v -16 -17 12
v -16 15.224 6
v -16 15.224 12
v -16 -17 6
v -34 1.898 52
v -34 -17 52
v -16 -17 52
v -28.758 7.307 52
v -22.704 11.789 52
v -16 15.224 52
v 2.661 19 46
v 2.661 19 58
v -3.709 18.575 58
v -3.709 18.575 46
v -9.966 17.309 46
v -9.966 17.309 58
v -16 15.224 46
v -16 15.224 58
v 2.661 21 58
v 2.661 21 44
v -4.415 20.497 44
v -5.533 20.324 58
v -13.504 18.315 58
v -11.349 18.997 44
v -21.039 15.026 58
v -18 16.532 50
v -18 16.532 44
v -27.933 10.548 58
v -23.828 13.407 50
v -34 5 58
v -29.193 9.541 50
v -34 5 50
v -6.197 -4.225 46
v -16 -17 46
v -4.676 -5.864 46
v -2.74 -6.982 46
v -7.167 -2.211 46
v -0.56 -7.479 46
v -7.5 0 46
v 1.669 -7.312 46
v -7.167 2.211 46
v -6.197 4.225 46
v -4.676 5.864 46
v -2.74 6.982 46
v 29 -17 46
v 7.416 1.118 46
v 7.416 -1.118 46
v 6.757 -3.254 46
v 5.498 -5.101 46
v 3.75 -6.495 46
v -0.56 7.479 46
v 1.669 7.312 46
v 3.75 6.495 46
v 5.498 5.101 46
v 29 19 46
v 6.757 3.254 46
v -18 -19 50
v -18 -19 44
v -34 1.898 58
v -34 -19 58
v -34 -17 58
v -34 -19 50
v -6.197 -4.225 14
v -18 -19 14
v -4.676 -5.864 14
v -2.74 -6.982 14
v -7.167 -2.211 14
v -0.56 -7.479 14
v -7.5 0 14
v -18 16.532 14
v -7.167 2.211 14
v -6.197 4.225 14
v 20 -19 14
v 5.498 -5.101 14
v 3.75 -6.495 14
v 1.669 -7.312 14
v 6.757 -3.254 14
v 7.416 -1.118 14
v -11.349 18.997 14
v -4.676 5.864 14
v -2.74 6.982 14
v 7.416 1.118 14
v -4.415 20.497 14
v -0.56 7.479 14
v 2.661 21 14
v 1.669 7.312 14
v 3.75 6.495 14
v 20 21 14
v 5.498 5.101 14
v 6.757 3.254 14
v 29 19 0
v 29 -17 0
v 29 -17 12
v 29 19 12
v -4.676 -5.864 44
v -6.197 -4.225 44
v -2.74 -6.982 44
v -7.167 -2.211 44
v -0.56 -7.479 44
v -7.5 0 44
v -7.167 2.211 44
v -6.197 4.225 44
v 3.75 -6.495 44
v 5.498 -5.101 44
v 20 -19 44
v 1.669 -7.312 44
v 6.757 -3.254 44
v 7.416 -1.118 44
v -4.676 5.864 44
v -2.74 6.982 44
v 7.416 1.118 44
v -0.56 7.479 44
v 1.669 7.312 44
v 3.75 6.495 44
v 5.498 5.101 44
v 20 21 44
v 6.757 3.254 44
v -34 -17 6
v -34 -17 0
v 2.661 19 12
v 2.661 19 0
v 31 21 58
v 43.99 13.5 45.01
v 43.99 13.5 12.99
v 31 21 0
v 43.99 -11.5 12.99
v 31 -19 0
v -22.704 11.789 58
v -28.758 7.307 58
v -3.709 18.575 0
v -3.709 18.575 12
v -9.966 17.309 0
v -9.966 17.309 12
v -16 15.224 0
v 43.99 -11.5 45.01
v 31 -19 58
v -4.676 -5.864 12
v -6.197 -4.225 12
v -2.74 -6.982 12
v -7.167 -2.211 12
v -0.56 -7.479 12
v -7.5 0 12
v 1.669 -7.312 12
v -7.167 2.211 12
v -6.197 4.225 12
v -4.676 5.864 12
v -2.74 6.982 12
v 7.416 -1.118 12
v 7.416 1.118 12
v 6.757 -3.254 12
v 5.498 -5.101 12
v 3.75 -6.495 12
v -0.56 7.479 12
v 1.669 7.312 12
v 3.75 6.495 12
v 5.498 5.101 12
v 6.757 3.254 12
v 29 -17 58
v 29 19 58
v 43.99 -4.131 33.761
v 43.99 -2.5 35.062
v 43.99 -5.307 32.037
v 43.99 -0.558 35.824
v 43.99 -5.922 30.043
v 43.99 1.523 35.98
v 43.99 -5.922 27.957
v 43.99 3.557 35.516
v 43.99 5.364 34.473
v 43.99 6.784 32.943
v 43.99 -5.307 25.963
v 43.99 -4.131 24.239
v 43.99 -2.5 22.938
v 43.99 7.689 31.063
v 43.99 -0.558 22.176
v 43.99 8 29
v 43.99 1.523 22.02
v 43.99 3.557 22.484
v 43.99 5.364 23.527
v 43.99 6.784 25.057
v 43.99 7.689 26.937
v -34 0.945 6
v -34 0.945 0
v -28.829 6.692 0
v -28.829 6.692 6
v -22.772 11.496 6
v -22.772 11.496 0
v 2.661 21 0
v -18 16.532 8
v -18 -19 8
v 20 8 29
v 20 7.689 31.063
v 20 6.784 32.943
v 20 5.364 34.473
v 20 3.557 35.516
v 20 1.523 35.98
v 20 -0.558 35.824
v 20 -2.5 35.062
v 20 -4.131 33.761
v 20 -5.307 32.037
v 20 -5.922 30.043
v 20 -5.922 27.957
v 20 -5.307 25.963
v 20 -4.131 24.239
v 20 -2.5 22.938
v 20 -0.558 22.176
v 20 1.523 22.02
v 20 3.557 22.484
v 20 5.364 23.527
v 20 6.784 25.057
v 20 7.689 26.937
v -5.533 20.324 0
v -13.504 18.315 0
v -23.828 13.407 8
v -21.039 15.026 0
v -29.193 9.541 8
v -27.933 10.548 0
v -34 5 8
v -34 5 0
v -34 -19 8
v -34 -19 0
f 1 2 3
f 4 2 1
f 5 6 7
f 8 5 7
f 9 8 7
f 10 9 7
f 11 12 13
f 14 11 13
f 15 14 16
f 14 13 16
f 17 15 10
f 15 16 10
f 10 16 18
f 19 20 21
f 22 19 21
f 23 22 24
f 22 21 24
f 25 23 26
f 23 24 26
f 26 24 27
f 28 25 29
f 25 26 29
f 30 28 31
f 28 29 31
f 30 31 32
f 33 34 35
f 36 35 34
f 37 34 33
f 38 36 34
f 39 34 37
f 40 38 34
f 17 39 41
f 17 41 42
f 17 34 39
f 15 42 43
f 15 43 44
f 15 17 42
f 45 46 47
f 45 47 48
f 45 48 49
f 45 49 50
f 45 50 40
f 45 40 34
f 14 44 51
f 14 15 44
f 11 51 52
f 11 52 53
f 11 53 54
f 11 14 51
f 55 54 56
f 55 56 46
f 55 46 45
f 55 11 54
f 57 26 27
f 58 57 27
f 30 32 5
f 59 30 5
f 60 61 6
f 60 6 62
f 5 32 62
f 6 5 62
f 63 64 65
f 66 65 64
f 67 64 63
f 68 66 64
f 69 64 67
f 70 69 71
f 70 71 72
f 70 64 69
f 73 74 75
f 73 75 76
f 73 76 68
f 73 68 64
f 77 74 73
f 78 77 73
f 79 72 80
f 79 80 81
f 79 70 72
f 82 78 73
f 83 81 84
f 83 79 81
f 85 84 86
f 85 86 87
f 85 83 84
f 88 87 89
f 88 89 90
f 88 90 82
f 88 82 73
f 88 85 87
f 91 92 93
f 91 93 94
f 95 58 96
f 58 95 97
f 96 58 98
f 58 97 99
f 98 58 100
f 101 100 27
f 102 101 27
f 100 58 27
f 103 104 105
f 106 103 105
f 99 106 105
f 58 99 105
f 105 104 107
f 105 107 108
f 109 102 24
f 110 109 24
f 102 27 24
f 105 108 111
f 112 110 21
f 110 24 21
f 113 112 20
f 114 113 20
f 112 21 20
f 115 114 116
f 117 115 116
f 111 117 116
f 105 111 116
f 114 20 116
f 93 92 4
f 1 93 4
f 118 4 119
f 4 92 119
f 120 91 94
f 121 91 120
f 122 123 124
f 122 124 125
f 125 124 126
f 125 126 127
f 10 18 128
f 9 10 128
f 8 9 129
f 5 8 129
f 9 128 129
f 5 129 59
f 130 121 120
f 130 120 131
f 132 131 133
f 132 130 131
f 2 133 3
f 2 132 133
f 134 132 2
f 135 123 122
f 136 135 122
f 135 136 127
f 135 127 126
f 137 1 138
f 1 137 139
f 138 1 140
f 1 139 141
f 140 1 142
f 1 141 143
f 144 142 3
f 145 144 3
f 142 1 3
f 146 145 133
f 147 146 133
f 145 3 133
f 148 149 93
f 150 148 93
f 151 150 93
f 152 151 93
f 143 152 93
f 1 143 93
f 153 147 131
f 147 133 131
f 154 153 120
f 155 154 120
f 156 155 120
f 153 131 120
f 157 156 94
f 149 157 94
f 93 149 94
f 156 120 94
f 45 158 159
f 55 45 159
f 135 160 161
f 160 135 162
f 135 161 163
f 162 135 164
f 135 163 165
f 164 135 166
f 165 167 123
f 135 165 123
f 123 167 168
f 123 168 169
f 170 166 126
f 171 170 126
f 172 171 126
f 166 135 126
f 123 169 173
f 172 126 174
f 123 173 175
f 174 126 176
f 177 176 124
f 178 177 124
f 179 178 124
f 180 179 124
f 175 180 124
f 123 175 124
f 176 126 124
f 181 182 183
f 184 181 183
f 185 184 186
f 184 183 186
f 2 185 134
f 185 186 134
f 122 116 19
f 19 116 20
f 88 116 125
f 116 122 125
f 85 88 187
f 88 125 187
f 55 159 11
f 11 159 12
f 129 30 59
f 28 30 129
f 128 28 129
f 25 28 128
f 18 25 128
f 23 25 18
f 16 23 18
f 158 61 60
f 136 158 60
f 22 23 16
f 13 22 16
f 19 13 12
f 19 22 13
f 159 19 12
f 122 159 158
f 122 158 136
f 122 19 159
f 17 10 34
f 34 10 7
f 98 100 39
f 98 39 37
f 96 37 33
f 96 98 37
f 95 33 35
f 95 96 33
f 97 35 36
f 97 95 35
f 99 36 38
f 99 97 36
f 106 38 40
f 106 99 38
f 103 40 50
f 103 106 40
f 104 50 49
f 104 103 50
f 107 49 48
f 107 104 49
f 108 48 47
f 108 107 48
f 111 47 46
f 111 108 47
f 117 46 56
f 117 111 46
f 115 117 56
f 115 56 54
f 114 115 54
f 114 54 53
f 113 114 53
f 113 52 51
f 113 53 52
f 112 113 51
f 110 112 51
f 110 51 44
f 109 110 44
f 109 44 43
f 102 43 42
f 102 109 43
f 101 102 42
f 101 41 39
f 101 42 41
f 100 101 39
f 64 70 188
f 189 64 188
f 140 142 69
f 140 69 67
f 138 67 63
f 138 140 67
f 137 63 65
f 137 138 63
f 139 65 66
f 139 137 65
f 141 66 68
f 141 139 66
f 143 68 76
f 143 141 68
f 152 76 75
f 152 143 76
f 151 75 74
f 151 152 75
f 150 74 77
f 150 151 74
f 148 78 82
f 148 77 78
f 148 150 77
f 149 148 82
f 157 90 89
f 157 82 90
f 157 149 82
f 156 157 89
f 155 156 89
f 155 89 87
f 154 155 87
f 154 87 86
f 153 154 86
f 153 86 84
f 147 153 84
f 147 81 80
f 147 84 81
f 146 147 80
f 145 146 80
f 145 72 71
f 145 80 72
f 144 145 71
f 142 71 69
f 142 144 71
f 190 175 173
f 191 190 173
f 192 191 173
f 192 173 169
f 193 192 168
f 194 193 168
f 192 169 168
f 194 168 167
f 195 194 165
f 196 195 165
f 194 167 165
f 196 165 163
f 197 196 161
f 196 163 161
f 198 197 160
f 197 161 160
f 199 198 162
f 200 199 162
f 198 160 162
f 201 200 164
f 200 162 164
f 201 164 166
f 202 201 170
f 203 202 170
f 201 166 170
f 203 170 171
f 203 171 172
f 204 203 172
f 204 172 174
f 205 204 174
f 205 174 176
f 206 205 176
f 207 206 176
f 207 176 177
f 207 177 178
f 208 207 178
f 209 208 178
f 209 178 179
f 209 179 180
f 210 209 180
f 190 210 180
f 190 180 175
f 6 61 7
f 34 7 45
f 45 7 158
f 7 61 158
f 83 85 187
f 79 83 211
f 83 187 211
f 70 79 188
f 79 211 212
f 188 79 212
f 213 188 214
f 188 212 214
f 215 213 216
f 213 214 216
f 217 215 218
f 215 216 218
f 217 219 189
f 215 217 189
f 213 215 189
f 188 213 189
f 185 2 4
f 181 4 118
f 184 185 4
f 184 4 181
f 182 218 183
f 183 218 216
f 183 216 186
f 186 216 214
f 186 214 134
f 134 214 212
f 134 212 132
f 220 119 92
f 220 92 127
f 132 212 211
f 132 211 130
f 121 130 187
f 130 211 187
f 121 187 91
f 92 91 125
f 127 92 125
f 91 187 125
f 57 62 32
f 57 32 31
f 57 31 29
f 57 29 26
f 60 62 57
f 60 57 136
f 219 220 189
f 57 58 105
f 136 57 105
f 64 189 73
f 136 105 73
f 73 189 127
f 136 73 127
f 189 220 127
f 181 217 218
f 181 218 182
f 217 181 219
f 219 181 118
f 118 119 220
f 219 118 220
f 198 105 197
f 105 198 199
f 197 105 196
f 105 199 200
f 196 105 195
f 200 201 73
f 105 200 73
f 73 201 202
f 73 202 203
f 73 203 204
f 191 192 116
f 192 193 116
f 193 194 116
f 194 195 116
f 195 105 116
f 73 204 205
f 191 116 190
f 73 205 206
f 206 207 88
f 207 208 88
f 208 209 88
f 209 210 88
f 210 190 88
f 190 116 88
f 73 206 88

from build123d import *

# Parameters (mm, degrees)
SKETCH1_R           = 7.5
BOSS_EXTRUDE1_DEPTH = 58
SKETCH2_W           = 38
SKETCH2_H           = 30
CUT_EXTRUDE1_DEPTH  = 58
SKETCH3_W           = 16
SKETCH3_H           = 6
CUT_EXTRUDE2_DEPTH  = 58
CUT_EXTRUDE3_DEPTH  = 58
SKETCH5_R           = 7
CUT_EXTRUDE4_DEPTH  = 58
CUT_EXTRUDE5_DEPTH  = 12
CUT_EXTRUDE6_DEPTH  = 6
CUT_EXTRUDE7_DEPTH  = 12
CUT_EXTRUDE8_DEPTH  = 6


with BuildPart() as part:
    # Sketch1 → Boss-Extrude1 (new body)
    with BuildSketch(Plane.XY):
        with BuildLine():
            Line((-34, 5), (-34, -19))
            Line((-34, -19), (31, -19))
            Line((31, -19), (43.990381057, -11.5))
            Line((43.990381057, -11.5), (43.990381057, 13.5))
            Line((43.990381057, 13.5), (31, 21))
            Line((31, 21), (2.66060556, 21))
            ThreePointArc((2.66060556, 21), (-17.33939444, 16.82575695), (-34, 5))
        make_face()
        Circle(SKETCH1_R, mode=Mode.SUBTRACT)
    extrude(amount=BOSS_EXTRUDE1_DEPTH)

    # Sketch2 → Cut-Extrude1 (cut)
    with BuildSketch(Plane(origin=(0, 21, 0), x_dir=(1, 0, 0), z_dir=(0, 1, 0))):
        with Locations((1, -29)):
            Rectangle(SKETCH2_W, SKETCH2_H)
    extrude(amount=-CUT_EXTRUDE1_DEPTH, mode=Mode.SUBTRACT)

    # Sketch3 → Cut-Extrude2 (cut)
    with BuildSketch(Plane(origin=(0, 21, 0), x_dir=(1, 0, 0), z_dir=(0, 1, 0))):
        with Locations((-26, -11)):
            Rectangle(SKETCH3_W, SKETCH3_H)
        with Locations((-26, -47)):
            Rectangle(SKETCH3_W, SKETCH3_H)
    extrude(amount=-CUT_EXTRUDE2_DEPTH, mode=Mode.SUBTRACT)


with BuildPart() as body_2:
    # of the pieces the cut leaves, the one that is kept (cut_extrude2_keep)
    add(part.part.solids().sort_by_distance((-34, 5, 0))[0])

    # Sketch4 → Cut-Extrude3 (cut)
    with BuildSketch(Plane(origin=(0, 21, 0), x_dir=(1, 0, 0), z_dir=(0, 1, 0))):
        Polygon((31, 0), (43.990381057, 0), (43.990381057, -12.990381057), align=None)
        Polygon((43.990381057, -58), (43.990381057, -45.009618943), (31, -58), align=None)
    extrude(amount=-CUT_EXTRUDE3_DEPTH, mode=Mode.SUBTRACT)

    # Sketch5 → Cut-Extrude4 (cut)
    with BuildSketch(Plane(origin=(43.990381057, 0, 0), x_dir=(0, 0, -1), z_dir=(1, 0, 0))):
        with Locations((-29, 1)):
            Circle(SKETCH5_R)
    extrude(amount=-CUT_EXTRUDE4_DEPTH, mode=Mode.SUBTRACT)

    # Sketch8 → Cut-Extrude5 (cut)
    with BuildSketch(Plane.XY.offset(58)):
        with BuildLine():
            Line((-16, 15.224221872), (-16, -17))
            Line((-16, -17), (29, -17))
            Line((29, -17), (29, 19))
            Line((29, 19), (2.66060556, 19))
            ThreePointArc((2.66060556, 19), (-6.858778616, 18.046586751), (-16, 15.224221872))
        make_face()
    extrude(amount=-CUT_EXTRUDE5_DEPTH, mode=Mode.SUBTRACT)

    # Sketch10 → Cut-Extrude6 (cut)
    with BuildSketch(Plane.XY.offset(58)):
        with BuildLine():
            Line((-16, -17), (-16, 15.224221872))
            ThreePointArc((-16, 15.224221872), (-25.82281671, 9.672366481), (-34, 1.897760392))
            Line((-34, 1.897760392), (-34, -17))
            Line((-34, -17), (-16, -17))
        make_face()
    extrude(amount=-CUT_EXTRUDE6_DEPTH, mode=Mode.SUBTRACT)

    # Sketch11 → Cut-Extrude7 (cut)
    with BuildSketch(Plane(origin=(0, 0, 0), x_dir=(-1, 0, 0), z_dir=(0, 0, -1))):
        with BuildLine():
            Line((16, 15.224221872), (16, -17))
            Line((16, -17), (-29, -17))
            Line((-29, -17), (-29, 19))
            Line((-29, 19), (-2.66060556, 19))
            ThreePointArc((-2.66060556, 19), (6.858778616, 18.046586751), (16, 15.224221872))
        make_face()
    extrude(amount=-CUT_EXTRUDE7_DEPTH, mode=Mode.SUBTRACT)

    # Sketch12 → Cut-Extrude8 (cut)
    with BuildSketch(Plane(origin=(0, 0, 0), x_dir=(-1, 0, 0), z_dir=(0, 0, -1))):
        with BuildLine():
            Line((16, 15.224221872), (16, -17))
            Line((16, -17), (34, -17))
            Line((34, -17), (34, 0.945438982))
            ThreePointArc((34, 0.945438982), (25.900918774, 9.220539125), (16, 15.224221872))
        make_face()
    extrude(amount=-CUT_EXTRUDE8_DEPTH, mode=Mode.SUBTRACT)


solid = body_2.part
